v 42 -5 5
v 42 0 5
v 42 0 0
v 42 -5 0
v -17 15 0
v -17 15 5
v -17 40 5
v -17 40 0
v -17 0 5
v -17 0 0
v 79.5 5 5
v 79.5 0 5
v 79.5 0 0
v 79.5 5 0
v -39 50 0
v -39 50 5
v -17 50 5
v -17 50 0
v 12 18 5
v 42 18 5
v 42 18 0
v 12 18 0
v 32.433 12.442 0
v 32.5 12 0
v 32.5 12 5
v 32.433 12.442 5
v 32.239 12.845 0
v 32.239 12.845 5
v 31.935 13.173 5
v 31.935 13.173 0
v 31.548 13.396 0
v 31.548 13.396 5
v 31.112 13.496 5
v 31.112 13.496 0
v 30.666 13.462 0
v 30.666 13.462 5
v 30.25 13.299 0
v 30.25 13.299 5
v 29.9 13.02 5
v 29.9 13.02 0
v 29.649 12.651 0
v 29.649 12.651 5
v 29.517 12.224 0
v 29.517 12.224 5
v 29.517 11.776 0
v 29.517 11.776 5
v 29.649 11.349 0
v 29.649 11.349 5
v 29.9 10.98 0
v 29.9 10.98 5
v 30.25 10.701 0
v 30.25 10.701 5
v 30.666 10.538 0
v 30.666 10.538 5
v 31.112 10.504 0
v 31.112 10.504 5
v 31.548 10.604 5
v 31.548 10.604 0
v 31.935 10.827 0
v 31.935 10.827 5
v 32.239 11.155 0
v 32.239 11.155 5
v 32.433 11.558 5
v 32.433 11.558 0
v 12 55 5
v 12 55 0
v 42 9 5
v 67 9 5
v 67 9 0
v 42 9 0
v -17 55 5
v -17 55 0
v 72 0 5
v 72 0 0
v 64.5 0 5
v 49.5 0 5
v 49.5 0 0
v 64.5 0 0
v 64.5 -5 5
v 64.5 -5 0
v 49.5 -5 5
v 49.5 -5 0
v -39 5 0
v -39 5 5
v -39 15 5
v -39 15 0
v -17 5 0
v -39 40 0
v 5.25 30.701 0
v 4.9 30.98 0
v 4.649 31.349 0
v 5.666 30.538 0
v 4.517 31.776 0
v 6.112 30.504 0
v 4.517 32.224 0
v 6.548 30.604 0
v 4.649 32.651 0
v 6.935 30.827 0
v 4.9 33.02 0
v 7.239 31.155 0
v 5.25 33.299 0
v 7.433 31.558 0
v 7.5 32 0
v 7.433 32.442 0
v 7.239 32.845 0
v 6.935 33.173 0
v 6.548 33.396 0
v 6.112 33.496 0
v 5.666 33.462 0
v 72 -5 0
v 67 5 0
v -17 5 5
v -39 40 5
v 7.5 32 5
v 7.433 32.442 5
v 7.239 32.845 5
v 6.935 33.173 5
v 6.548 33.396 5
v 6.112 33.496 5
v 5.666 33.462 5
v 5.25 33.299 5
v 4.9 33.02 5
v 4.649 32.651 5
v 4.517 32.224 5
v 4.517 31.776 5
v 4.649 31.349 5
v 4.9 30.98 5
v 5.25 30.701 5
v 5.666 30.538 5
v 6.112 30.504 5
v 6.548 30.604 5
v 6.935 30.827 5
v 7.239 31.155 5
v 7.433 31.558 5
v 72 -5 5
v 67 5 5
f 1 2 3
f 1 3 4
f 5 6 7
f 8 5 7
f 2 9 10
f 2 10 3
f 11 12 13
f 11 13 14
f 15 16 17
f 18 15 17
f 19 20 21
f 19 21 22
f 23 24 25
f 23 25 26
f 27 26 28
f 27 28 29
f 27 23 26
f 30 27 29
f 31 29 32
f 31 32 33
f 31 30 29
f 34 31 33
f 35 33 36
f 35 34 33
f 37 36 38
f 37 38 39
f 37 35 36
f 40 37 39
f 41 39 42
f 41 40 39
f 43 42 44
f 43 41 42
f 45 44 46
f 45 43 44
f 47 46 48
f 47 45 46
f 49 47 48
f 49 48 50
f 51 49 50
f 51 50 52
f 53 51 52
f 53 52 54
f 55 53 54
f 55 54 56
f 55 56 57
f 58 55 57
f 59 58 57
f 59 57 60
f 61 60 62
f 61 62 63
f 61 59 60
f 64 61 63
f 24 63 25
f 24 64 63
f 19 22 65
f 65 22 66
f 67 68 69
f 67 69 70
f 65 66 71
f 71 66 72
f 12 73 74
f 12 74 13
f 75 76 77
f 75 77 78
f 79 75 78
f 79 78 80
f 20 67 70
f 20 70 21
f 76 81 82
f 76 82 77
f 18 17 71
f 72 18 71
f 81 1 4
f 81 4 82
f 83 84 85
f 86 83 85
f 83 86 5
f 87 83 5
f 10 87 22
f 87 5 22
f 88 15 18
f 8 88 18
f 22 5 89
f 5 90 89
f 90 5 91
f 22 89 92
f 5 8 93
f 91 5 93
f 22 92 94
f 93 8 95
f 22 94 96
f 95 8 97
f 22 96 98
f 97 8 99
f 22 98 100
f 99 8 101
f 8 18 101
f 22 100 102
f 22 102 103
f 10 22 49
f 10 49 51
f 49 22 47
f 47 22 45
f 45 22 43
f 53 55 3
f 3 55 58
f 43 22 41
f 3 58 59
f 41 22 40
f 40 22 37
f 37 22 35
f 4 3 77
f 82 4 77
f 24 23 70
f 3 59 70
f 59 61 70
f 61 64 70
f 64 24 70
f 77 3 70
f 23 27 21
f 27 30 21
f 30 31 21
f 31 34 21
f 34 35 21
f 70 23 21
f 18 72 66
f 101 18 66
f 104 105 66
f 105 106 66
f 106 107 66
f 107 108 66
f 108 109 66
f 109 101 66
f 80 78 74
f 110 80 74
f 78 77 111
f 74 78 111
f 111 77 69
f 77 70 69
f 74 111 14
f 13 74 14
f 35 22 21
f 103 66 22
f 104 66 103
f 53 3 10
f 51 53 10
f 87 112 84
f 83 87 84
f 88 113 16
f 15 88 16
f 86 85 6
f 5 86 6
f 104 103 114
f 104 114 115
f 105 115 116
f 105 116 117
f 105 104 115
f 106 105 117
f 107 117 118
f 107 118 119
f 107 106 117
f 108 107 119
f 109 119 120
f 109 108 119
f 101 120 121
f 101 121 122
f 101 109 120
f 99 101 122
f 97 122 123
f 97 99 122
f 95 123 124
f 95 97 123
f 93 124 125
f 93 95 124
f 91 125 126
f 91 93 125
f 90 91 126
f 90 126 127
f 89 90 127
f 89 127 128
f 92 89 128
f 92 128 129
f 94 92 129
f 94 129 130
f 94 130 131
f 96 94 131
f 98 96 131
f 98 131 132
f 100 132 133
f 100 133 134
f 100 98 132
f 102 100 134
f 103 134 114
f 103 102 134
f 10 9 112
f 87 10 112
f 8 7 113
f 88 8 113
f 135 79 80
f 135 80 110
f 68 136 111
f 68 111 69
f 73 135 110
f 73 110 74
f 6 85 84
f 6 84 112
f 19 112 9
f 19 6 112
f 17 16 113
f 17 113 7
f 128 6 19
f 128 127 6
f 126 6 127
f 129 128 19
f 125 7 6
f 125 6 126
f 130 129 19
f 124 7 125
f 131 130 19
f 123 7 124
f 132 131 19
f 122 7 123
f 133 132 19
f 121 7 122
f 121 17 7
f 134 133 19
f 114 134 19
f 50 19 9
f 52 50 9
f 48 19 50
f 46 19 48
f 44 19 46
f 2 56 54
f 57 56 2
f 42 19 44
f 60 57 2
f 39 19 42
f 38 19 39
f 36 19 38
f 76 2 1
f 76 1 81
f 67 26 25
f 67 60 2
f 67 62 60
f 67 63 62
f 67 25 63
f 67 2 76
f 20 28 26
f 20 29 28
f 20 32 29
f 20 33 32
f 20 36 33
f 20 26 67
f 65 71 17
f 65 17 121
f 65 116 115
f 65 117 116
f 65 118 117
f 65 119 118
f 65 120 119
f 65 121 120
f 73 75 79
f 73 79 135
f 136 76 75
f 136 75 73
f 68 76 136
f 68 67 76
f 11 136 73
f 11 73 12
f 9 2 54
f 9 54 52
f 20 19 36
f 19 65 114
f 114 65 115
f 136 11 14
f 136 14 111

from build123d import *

# Parameters (mm, degrees)
ESQUISSE1_R        = 1.5
BOSS_EXTRU_1_DEPTH = 5
BOSS_EXTRU_2_DEPTH = 5


with BuildPart() as part:
    # Esquisse1 → Boss.-Extru.1 (new body)
    with BuildSketch(Plane.XY):
        Polygon((0, 0), (37, 0), (37, 18), (12, 18), (12, 55), (0, 55), align=None)
        with Locations((6, 32)):
            Circle(ESQUISSE1_R, mode=Mode.SUBTRACT)
        with Locations((31, 12)):
            Circle(ESQUISSE1_R, mode=Mode.SUBTRACT)
    extrude(amount=BOSS_EXTRU_1_DEPTH)

    # Esquisse2 → Boss.-Extru.2 (add)
    with BuildSketch(Plane.XY.offset(5)):
        Polygon((37, 0), (42, 0), (42, -5), (49.5, -5), (49.5, 0), (64.5, 0), (64.5, -5), (72, -5), (72, 0), (79.5, 0), (79.5, 5), (67, 5), (67, 9), (42, 9), (42, 18), (37, 18), align=None)
        Polygon((0, 0), (-17, 0), (-17, 5), (-39, 5), (-39, 15), (-17, 15), (-17, 40), (-39, 40), (-39, 50), (-17, 50), (-17, 55), (0, 55), align=None)
    extrude(amount=-BOSS_EXTRU_2_DEPTH)


solid = part.part
